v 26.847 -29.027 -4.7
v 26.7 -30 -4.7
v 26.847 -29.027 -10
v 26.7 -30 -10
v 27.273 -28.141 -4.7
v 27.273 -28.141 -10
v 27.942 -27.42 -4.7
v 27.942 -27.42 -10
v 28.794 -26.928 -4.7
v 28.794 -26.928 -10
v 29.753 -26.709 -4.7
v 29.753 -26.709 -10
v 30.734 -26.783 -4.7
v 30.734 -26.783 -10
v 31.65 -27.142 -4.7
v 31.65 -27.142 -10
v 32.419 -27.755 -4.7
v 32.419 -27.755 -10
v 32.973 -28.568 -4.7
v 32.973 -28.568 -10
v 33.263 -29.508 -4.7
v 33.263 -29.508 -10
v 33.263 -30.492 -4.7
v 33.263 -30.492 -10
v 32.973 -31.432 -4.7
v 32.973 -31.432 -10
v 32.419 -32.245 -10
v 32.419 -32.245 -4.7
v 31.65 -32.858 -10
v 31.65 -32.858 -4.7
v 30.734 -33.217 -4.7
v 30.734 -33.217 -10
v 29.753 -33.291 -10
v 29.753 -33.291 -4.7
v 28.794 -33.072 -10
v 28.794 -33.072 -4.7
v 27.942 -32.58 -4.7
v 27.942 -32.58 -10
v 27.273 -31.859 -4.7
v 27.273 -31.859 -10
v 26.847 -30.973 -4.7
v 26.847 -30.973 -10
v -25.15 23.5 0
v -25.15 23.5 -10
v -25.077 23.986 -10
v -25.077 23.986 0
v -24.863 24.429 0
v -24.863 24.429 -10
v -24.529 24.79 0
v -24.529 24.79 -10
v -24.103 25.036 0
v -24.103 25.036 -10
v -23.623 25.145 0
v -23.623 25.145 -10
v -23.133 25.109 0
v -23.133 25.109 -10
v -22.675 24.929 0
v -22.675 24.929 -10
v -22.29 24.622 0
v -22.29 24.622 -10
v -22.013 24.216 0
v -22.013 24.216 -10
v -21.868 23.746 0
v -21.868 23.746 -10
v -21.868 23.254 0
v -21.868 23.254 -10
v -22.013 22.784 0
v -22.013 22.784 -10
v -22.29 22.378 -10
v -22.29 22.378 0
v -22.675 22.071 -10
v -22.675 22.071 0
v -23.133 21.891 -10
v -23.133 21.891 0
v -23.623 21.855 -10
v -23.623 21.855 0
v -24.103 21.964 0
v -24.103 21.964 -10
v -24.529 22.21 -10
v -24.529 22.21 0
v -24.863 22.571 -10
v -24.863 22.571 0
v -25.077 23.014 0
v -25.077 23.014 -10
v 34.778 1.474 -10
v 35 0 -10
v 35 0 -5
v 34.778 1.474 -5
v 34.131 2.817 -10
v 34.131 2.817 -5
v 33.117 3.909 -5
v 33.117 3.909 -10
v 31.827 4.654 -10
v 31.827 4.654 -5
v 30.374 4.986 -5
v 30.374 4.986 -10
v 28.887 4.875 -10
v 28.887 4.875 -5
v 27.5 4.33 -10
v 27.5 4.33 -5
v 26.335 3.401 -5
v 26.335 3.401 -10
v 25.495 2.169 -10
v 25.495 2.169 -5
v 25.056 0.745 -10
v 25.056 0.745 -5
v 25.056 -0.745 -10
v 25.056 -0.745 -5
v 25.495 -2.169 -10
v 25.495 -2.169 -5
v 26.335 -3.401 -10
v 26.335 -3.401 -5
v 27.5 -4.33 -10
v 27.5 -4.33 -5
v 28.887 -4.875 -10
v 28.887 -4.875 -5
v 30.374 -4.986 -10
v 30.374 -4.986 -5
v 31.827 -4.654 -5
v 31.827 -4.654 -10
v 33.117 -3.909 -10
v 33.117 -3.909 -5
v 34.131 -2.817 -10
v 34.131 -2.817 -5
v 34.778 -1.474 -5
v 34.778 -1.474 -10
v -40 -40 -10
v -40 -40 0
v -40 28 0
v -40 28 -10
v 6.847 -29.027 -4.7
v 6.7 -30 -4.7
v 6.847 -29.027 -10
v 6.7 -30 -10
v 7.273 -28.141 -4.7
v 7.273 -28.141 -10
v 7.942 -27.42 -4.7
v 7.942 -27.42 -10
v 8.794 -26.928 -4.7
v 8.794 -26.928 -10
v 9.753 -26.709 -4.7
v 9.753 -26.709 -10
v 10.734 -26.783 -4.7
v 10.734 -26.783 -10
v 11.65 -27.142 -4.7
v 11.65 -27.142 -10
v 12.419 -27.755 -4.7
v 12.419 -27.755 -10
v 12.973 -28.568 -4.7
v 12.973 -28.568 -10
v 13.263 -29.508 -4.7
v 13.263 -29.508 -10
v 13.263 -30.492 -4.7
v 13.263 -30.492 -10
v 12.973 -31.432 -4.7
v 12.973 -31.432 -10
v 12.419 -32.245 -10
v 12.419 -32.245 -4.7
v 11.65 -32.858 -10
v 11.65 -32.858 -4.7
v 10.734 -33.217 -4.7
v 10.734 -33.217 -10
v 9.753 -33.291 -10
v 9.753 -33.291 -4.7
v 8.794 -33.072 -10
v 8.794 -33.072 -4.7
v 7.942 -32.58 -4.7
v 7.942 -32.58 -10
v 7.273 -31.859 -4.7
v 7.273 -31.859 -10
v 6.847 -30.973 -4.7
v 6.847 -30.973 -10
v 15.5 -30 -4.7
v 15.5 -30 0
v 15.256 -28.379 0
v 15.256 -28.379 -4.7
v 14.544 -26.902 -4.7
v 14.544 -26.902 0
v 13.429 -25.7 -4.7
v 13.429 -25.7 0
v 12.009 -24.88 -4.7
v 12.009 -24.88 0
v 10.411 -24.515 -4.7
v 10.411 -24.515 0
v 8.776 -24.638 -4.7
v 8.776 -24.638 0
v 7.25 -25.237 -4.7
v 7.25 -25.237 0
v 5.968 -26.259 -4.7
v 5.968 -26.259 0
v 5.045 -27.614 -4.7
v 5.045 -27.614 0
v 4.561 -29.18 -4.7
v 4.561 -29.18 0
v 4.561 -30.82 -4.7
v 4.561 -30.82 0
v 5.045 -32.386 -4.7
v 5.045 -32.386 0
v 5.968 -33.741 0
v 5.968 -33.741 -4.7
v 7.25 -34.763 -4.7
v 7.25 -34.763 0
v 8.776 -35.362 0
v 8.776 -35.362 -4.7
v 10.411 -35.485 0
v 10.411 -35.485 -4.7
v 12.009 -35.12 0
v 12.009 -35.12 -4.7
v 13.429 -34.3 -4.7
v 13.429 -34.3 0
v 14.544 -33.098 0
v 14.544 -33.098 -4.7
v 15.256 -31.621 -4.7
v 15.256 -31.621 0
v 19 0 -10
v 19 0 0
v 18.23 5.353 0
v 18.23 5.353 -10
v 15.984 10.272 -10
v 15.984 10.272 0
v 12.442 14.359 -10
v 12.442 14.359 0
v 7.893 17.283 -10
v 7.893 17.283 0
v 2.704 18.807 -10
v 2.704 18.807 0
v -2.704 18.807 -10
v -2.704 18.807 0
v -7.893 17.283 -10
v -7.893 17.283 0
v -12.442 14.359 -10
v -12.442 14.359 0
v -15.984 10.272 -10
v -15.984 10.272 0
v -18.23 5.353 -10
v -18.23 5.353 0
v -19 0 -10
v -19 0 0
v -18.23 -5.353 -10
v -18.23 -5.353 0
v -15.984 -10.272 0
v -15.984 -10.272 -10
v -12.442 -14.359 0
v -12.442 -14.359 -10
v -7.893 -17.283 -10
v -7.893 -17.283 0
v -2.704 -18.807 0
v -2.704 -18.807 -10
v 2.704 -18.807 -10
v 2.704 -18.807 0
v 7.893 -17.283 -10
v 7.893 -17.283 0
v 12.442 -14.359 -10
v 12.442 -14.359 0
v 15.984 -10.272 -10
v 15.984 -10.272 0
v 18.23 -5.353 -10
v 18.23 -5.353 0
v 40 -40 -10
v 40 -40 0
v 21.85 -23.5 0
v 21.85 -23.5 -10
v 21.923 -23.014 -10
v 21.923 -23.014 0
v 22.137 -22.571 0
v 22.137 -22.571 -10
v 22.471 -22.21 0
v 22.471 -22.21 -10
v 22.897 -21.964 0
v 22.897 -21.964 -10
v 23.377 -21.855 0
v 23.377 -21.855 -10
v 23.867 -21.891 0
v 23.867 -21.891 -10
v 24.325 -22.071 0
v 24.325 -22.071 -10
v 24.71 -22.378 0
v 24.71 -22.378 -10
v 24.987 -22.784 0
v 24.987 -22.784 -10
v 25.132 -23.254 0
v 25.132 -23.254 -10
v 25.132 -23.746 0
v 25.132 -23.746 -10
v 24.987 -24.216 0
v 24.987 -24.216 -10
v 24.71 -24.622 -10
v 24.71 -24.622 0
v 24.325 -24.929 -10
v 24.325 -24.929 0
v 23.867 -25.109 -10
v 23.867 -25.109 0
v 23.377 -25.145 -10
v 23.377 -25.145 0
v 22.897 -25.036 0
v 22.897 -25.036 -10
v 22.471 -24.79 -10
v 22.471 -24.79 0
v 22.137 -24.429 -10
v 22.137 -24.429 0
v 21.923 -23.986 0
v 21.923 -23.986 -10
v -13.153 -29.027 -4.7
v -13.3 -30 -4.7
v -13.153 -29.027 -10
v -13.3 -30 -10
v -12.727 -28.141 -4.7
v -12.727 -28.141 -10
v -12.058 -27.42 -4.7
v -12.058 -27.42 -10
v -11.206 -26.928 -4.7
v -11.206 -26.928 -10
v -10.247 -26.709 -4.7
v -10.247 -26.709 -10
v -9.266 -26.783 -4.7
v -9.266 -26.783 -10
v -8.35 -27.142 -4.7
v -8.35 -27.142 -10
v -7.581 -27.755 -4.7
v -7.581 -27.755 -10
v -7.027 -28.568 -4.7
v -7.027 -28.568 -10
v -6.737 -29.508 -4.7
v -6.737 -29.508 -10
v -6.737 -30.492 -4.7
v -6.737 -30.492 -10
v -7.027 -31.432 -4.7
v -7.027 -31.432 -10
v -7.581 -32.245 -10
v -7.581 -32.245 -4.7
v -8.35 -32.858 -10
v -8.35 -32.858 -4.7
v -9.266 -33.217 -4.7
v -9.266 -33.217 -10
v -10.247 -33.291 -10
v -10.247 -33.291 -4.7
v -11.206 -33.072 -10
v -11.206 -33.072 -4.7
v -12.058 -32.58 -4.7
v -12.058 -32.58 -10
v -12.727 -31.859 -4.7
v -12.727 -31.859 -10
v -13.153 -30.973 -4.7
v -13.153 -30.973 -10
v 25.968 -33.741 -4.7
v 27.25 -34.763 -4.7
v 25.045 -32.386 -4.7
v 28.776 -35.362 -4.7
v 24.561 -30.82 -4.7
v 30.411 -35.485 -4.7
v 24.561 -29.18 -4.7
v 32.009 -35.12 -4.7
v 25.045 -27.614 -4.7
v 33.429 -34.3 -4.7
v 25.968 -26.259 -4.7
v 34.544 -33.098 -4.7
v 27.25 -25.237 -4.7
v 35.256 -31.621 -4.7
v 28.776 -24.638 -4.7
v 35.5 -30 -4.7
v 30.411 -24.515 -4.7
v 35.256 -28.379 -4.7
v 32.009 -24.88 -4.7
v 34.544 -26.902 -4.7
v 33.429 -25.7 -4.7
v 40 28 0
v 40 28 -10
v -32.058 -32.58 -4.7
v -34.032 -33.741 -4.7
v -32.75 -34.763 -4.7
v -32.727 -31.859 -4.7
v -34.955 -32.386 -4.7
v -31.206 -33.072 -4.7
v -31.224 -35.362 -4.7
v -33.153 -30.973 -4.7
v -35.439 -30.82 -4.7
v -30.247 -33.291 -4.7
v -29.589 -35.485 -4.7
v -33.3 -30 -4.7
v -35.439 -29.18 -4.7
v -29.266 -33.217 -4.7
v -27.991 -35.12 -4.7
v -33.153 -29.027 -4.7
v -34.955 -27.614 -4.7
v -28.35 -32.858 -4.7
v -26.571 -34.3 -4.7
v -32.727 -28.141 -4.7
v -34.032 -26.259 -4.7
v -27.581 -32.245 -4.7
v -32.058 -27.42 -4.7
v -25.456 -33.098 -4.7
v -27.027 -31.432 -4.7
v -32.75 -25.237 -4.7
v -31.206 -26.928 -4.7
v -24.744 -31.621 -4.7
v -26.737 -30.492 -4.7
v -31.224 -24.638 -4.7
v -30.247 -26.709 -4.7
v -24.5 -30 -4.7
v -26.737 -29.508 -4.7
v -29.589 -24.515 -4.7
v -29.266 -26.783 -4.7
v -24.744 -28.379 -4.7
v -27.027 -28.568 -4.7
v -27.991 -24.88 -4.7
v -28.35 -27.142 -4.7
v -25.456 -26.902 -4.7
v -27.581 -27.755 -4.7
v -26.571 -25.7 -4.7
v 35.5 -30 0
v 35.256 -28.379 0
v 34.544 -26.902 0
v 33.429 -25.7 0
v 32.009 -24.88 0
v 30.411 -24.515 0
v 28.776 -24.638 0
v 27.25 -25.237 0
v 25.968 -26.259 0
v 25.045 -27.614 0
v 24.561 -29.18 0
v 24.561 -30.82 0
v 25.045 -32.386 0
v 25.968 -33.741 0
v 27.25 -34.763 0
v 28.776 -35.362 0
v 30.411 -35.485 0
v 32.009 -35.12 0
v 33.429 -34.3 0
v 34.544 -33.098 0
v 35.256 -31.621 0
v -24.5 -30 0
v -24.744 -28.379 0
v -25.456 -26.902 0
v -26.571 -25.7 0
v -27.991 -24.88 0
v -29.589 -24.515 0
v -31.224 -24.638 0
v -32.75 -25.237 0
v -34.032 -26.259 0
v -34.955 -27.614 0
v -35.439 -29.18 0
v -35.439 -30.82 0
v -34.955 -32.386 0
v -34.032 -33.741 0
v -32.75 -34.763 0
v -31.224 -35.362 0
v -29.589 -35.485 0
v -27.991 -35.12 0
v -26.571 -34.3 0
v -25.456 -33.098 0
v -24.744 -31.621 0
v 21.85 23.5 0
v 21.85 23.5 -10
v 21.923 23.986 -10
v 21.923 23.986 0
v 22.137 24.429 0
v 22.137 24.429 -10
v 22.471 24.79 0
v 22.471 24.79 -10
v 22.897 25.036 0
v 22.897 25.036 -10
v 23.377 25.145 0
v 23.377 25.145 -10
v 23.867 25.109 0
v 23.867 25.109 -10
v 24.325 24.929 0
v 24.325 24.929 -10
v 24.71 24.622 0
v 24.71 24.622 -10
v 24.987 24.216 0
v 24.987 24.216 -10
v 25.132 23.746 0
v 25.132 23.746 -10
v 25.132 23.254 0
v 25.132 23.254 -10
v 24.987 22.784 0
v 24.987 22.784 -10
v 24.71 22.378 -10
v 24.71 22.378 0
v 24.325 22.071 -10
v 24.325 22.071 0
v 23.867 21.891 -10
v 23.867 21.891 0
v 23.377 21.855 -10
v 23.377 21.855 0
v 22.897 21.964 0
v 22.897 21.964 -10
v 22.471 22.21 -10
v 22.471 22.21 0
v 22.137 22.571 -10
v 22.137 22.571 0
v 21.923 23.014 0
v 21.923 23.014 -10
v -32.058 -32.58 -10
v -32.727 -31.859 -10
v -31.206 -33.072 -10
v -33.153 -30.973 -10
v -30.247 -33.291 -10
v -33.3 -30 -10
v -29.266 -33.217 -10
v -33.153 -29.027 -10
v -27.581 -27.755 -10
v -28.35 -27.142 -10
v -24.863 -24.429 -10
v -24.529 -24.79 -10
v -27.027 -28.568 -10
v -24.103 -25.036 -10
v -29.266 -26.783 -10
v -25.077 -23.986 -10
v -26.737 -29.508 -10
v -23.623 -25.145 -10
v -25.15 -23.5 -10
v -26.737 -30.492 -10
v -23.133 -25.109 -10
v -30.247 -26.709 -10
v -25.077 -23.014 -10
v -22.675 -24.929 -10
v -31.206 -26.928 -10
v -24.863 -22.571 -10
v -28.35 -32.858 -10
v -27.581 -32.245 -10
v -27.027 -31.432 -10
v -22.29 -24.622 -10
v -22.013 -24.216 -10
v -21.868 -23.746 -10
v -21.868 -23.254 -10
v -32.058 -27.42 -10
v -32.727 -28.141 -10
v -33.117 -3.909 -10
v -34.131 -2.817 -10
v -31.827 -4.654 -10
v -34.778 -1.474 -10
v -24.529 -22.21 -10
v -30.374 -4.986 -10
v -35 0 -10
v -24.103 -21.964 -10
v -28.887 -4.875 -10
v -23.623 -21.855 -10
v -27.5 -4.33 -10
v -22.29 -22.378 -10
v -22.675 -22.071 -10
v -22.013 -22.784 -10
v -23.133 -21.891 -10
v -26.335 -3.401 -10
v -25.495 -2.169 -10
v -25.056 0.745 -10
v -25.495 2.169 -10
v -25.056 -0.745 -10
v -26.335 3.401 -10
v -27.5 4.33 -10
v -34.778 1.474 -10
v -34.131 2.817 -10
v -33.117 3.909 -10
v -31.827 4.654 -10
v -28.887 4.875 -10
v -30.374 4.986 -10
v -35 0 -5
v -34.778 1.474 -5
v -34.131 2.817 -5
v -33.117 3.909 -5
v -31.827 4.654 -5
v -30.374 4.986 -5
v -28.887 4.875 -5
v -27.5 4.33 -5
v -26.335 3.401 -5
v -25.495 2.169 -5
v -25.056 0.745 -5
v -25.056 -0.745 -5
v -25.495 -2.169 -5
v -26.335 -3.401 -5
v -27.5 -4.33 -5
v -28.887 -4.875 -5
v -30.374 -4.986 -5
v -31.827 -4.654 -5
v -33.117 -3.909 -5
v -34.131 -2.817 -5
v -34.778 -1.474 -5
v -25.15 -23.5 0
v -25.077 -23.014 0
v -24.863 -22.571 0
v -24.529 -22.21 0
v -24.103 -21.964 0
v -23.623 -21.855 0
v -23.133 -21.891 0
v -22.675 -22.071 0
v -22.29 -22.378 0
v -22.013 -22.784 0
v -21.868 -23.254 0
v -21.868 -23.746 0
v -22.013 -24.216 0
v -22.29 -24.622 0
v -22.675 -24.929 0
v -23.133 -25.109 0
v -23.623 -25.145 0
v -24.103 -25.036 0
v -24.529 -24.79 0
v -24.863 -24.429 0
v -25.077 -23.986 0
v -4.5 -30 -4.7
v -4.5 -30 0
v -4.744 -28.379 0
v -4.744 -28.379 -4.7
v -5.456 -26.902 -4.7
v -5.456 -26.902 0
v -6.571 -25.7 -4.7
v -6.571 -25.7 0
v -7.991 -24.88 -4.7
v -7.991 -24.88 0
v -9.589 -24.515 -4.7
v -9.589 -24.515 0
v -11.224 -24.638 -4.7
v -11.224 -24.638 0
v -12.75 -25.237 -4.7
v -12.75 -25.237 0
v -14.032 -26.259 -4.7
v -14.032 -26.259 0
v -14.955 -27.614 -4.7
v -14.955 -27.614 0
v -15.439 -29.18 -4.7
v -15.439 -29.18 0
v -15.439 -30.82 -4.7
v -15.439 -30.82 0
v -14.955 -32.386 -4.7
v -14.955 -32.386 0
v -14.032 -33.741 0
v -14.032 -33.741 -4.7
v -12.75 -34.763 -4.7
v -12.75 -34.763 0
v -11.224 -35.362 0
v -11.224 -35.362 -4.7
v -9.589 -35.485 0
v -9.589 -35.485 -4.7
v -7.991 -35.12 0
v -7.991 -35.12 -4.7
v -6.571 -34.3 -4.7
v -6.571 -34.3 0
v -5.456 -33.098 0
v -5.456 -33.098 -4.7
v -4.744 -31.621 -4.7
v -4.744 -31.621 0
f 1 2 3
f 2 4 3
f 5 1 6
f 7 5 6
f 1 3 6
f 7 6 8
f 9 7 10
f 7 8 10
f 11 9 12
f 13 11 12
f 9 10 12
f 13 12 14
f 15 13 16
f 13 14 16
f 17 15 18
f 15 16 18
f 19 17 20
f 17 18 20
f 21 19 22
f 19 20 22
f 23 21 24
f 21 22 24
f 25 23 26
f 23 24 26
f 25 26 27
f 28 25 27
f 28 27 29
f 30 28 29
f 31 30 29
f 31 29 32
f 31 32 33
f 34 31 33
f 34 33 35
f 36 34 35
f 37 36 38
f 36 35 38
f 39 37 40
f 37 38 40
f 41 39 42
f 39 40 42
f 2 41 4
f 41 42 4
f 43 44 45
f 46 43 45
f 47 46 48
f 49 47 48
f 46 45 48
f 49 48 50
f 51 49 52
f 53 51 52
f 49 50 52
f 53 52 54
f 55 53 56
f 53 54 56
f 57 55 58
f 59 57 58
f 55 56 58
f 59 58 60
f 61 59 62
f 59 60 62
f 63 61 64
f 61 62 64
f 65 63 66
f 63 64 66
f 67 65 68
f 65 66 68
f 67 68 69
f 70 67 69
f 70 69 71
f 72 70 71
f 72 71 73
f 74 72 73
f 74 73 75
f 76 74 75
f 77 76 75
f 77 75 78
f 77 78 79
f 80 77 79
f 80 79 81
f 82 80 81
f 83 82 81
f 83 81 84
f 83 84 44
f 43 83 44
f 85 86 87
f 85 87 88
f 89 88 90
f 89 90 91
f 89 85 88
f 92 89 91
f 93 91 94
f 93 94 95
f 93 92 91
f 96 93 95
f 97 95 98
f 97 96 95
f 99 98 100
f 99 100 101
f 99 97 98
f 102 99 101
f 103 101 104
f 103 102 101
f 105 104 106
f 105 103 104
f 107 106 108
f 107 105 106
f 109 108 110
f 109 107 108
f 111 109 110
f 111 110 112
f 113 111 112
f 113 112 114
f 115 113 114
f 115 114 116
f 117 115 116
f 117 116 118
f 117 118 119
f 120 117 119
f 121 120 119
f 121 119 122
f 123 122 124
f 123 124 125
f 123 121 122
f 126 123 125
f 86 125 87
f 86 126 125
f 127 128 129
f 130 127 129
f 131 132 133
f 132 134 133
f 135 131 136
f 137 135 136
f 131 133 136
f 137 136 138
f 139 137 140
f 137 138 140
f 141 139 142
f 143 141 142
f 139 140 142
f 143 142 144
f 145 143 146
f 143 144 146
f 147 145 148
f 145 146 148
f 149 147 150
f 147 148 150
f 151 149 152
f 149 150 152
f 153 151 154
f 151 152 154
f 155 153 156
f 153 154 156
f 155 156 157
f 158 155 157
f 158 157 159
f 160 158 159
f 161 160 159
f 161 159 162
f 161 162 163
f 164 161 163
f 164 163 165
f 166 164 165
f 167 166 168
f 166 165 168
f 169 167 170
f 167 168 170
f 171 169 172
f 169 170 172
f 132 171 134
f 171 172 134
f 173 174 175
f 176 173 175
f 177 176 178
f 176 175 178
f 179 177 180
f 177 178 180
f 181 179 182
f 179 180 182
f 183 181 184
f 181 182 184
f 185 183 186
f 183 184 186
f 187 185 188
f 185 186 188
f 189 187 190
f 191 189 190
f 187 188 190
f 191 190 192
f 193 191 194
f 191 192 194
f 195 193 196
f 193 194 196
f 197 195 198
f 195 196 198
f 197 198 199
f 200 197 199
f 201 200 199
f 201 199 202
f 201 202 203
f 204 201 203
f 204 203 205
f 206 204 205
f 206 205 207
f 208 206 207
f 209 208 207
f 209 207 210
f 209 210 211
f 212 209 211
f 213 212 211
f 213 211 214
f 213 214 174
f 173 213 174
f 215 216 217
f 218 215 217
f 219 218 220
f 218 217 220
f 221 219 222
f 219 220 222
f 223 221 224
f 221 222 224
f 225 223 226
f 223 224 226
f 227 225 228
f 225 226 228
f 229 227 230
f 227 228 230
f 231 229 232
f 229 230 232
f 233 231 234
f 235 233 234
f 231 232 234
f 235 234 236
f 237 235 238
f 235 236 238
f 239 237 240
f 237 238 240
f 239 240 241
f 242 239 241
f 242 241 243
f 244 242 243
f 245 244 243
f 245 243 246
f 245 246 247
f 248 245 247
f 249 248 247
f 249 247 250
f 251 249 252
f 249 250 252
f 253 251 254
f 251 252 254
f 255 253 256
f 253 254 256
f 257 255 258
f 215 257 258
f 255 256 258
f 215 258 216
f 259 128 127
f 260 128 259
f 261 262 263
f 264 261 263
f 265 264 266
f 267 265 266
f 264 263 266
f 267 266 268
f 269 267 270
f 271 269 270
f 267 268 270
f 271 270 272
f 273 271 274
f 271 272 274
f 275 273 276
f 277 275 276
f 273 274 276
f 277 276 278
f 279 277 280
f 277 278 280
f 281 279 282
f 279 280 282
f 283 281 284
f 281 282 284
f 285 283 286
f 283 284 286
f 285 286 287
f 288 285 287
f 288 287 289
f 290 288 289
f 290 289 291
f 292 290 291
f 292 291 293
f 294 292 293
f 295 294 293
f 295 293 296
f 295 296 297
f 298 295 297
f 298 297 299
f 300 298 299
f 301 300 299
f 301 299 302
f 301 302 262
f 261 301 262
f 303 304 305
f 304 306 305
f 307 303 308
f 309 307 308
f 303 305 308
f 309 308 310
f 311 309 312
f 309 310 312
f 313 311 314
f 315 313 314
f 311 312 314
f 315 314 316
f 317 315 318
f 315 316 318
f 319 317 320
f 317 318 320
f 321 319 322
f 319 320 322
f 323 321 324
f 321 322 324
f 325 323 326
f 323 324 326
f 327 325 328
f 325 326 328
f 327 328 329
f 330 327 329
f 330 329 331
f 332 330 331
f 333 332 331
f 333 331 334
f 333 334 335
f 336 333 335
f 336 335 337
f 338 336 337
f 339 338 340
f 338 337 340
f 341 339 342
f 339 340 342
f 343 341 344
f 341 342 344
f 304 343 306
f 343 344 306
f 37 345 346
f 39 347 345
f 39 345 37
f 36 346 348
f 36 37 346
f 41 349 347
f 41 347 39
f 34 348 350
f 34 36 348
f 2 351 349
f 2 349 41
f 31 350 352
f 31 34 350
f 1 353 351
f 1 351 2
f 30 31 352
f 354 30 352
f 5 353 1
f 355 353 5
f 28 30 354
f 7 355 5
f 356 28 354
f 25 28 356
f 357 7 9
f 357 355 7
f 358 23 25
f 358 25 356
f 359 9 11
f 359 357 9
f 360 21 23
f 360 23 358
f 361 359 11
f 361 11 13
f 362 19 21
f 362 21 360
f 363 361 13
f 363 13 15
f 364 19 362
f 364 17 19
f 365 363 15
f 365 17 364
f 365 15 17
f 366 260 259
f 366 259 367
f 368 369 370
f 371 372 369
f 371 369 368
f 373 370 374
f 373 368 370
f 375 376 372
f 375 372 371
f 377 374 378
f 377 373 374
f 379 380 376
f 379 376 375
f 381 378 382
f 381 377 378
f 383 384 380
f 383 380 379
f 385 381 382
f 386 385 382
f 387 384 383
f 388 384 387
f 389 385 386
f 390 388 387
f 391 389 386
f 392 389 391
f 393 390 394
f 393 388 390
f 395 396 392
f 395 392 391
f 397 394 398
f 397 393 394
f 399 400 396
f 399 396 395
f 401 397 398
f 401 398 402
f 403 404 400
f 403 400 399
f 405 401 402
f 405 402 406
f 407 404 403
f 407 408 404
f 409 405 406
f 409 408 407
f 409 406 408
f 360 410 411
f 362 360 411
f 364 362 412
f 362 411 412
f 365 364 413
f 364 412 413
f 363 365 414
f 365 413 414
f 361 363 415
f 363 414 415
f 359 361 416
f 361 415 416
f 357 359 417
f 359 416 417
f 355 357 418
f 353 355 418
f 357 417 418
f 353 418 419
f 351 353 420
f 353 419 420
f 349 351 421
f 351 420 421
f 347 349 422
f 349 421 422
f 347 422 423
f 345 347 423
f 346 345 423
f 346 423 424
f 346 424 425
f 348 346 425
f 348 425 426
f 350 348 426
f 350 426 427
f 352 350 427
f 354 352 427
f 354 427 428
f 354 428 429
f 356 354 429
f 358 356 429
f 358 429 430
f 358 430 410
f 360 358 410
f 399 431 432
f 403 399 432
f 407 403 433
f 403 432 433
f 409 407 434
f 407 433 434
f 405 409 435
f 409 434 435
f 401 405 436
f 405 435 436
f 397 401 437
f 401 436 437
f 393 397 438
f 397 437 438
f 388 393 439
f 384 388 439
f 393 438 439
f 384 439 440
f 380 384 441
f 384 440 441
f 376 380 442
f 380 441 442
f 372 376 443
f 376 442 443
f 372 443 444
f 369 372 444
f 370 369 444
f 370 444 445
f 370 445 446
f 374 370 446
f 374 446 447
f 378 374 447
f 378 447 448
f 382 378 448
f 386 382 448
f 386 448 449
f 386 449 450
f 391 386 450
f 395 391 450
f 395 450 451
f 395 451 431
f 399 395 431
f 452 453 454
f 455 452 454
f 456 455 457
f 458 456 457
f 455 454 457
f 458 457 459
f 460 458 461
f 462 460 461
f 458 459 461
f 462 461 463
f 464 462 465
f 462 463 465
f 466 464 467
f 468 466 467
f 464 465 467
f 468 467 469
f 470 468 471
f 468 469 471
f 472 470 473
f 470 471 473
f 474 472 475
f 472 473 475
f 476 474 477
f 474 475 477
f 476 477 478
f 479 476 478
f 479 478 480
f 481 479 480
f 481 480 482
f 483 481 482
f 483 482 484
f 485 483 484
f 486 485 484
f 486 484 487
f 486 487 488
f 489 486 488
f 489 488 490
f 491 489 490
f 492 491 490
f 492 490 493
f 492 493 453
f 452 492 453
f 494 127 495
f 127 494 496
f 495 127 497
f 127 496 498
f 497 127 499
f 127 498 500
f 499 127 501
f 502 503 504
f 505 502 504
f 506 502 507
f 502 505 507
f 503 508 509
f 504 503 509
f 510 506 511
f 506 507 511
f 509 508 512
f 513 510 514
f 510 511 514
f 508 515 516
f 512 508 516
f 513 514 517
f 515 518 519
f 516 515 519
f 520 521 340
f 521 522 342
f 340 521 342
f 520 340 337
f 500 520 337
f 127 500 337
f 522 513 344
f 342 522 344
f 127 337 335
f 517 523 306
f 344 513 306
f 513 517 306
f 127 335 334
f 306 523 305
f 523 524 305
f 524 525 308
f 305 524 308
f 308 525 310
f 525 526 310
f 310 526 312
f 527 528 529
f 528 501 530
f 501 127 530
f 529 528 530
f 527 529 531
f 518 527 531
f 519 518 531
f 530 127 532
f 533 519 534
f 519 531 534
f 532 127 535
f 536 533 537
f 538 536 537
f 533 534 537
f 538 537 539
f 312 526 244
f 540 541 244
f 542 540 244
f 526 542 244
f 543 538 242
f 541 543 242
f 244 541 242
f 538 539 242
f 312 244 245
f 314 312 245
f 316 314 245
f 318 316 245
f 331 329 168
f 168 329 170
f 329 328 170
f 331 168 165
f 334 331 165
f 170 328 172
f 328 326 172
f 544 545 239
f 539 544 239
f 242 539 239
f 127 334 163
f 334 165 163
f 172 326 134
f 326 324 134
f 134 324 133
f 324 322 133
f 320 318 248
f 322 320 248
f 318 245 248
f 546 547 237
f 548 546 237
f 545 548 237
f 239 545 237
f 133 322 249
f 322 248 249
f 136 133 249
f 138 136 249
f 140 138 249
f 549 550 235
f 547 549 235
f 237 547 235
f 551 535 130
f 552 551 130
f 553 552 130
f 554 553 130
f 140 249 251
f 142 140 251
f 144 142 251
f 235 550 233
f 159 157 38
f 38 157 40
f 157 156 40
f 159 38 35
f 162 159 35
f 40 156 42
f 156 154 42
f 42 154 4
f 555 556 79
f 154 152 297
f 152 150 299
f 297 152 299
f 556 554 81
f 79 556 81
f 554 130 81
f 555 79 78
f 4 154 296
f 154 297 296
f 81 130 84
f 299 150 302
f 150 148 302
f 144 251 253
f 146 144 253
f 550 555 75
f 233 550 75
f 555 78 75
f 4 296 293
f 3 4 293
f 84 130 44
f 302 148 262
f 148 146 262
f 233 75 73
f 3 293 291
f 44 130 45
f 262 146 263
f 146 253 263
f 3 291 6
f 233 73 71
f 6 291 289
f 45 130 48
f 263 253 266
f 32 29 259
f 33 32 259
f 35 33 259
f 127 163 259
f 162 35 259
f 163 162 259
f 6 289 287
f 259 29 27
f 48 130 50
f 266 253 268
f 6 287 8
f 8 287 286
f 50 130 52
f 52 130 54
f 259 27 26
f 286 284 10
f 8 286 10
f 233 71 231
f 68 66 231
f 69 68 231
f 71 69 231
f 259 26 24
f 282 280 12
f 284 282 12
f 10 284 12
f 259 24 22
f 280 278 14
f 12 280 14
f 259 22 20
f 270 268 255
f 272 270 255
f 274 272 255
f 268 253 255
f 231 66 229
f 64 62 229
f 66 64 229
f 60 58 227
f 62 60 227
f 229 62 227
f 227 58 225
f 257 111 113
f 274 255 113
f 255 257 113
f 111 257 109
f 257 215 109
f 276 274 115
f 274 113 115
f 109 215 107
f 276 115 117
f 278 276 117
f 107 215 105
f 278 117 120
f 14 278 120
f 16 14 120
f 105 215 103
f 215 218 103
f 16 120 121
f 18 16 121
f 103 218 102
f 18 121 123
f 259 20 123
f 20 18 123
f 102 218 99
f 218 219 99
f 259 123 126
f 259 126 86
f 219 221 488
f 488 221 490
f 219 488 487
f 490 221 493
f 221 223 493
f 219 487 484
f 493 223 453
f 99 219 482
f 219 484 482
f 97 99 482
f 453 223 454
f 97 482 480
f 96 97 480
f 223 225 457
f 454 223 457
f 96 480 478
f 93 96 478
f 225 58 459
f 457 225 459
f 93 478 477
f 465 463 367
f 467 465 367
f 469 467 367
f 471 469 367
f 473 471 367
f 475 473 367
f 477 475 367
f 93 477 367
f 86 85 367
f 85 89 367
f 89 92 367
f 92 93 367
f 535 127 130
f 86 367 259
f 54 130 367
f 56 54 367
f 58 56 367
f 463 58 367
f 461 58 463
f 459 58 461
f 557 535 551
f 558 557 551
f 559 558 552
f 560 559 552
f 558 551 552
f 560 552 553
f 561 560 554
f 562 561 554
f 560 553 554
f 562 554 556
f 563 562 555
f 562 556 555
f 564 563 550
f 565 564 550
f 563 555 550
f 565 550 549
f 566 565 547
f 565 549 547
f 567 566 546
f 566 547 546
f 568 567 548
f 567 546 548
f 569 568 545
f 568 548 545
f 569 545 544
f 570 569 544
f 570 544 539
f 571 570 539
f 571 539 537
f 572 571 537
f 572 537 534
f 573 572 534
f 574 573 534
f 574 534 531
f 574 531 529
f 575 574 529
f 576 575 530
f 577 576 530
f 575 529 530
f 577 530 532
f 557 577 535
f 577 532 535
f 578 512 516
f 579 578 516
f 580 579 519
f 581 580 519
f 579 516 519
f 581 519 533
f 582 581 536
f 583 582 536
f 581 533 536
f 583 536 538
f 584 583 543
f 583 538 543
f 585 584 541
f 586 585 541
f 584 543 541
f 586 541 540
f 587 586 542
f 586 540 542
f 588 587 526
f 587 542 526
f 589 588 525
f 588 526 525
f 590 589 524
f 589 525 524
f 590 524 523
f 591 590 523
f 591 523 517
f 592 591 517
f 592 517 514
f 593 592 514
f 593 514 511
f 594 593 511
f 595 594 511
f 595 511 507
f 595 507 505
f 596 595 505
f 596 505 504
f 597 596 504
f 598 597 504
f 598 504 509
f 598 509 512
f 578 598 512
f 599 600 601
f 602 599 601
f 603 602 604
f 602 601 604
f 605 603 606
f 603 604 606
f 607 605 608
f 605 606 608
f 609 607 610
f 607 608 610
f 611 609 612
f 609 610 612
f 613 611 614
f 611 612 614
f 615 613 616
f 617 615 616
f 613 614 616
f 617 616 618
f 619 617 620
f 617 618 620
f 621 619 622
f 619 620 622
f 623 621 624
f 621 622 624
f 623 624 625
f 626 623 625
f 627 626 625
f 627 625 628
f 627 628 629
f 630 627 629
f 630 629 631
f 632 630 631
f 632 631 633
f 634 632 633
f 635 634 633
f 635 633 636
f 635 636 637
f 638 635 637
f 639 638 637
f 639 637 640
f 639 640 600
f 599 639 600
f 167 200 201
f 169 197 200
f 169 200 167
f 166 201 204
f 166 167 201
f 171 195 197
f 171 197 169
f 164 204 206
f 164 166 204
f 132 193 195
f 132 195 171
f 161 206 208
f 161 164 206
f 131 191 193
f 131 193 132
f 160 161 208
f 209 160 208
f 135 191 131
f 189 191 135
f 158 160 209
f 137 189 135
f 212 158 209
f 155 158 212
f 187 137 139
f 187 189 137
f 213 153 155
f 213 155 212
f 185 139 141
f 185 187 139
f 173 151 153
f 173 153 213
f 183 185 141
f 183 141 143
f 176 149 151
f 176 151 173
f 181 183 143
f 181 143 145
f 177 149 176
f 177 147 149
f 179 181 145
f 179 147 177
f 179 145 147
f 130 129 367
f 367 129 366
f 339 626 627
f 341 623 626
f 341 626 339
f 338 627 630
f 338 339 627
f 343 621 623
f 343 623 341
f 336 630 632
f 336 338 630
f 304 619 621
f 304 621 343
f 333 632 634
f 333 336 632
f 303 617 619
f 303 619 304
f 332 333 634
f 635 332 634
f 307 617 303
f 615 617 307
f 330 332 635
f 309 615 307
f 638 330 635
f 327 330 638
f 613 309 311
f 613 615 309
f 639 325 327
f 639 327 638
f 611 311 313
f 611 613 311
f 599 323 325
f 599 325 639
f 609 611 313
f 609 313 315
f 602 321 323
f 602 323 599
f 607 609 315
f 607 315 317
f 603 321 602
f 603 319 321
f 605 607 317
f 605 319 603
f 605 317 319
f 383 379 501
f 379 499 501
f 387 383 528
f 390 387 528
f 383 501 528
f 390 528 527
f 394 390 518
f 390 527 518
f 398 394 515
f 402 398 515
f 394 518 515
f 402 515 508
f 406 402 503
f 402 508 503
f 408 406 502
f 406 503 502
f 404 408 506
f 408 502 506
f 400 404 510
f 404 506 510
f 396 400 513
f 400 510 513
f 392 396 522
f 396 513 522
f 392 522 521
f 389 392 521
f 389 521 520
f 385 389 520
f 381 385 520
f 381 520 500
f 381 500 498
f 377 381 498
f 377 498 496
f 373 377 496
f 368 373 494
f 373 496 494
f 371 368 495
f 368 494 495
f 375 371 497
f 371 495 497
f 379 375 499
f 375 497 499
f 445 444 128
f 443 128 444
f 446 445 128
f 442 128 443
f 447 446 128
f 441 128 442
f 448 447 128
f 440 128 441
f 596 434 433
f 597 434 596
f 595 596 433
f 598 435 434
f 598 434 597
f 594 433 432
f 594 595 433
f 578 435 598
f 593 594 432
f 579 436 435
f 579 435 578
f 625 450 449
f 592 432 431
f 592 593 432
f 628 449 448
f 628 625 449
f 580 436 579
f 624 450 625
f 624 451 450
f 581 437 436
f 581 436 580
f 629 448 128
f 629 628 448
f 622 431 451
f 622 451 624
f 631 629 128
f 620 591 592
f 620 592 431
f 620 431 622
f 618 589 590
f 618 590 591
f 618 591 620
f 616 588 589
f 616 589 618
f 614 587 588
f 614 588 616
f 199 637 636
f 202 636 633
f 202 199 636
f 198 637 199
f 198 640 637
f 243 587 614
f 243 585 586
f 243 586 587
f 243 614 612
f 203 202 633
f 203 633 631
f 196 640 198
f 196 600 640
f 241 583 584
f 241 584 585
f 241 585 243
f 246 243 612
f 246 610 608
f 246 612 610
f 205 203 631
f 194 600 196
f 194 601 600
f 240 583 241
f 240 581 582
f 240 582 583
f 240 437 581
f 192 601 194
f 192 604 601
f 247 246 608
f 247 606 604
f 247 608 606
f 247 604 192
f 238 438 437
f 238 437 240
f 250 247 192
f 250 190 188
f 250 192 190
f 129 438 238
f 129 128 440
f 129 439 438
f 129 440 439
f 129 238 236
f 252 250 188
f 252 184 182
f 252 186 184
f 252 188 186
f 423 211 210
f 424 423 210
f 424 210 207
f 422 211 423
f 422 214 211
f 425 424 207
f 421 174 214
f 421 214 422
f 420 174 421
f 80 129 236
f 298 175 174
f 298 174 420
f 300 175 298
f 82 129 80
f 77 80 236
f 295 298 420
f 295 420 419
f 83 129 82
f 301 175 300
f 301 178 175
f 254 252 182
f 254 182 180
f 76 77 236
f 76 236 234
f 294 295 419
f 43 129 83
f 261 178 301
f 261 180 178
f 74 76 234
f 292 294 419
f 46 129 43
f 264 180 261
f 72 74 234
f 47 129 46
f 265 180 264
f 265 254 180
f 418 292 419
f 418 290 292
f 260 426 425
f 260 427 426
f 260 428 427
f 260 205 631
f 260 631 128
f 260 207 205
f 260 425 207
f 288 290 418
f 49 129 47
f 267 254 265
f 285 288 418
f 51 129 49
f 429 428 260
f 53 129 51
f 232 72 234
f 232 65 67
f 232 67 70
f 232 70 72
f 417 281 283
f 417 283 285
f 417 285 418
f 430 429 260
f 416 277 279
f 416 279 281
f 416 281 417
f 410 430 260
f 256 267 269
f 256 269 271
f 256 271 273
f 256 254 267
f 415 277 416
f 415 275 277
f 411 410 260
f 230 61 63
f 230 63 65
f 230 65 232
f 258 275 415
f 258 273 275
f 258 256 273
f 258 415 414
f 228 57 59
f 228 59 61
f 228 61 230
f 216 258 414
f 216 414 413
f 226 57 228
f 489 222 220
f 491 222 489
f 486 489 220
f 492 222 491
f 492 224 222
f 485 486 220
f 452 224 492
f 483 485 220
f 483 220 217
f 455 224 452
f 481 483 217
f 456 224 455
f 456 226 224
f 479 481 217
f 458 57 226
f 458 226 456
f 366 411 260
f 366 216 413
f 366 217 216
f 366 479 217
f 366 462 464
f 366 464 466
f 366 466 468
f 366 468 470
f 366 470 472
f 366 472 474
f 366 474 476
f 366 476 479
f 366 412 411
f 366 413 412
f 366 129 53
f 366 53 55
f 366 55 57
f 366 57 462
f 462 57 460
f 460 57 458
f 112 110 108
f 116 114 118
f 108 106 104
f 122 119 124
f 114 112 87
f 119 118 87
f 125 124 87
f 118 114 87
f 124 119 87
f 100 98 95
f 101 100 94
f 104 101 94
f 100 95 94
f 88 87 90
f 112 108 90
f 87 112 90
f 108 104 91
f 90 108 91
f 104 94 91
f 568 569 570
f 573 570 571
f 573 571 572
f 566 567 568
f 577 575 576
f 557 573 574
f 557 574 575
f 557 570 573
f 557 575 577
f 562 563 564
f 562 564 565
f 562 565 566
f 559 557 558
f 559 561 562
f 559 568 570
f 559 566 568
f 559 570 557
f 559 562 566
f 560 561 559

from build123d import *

# Parameters (mm, degrees)
SKETCH_1_W                   = 80
SKETCH_1_H                   = 68
EXTRUDE_1_DEPTH              = 10
SKETCH_2_R                   = 19
CUT_EXTRUDE_1_DEPTH          = 10
HOLE_WIZARD_M6_1_D           = 6.6
HOLE_WIZARD_M6_1_CBORE_D     = 11
HOLE_WIZARD_M6_1_CBORE_DEPTH = 4.7
HOLE_WIZARD_M4_1_D           = 3.3
SKETCH_7_R                   = 5
CUT_EXTRUDE_2_DEPTH          = 5


with BuildPart() as part:
    # 草图1 → 凸台-拉伸1 (new body)
    with BuildSketch(Plane.XY):
        with Locations((0, -6)):
            Rectangle(SKETCH_1_W, SKETCH_1_H)
    extrude(amount=-EXTRUDE_1_DEPTH)

    # 草图2 → 切除-拉伸1 (cut)
    with BuildSketch(Plane.XY):
        Circle(SKETCH_2_R)
    extrude(amount=-CUT_EXTRUDE_1_DEPTH, mode=Mode.SUBTRACT)

    # M6 内六角花型圆柱头螺钉的柱形沉头孔1 (through all)
    with Locations(Plane.XY):
        with Locations((30, -30), (-30, -30), (10, -30), (-10, -30)):
            CounterBoreHole(HOLE_WIZARD_M6_1_D / 2, HOLE_WIZARD_M6_1_CBORE_D / 2, HOLE_WIZARD_M6_1_CBORE_DEPTH)

    # M4 螺纹孔1 (through all)
    with Locations(Plane.XY):
        with Locations((23.5, -23.5), (0, 0), (23.5, 23.5), (-23.5, -23.5), (-23.5, 23.5)):
            Hole(HOLE_WIZARD_M4_1_D / 2)

    # 草图7 → 切除-拉伸2 (cut)
    with BuildSketch(Plane.XY.offset(-10)):
        with Locations((30, 0)):
            Circle(SKETCH_7_R)
    cut_extrude_2 = extrude(amount=CUT_EXTRUDE_2_DEPTH, mode=Mode.SUBTRACT)

    # 镜向1: 切除-拉伸2 across plane
    add(cut_extrude_2.mirror(Plane(origin=(0, 0, 0), x_dir=(0, 0, 1), z_dir=(1, 0, 0))), mode=Mode.SUBTRACT)


solid = part.part
